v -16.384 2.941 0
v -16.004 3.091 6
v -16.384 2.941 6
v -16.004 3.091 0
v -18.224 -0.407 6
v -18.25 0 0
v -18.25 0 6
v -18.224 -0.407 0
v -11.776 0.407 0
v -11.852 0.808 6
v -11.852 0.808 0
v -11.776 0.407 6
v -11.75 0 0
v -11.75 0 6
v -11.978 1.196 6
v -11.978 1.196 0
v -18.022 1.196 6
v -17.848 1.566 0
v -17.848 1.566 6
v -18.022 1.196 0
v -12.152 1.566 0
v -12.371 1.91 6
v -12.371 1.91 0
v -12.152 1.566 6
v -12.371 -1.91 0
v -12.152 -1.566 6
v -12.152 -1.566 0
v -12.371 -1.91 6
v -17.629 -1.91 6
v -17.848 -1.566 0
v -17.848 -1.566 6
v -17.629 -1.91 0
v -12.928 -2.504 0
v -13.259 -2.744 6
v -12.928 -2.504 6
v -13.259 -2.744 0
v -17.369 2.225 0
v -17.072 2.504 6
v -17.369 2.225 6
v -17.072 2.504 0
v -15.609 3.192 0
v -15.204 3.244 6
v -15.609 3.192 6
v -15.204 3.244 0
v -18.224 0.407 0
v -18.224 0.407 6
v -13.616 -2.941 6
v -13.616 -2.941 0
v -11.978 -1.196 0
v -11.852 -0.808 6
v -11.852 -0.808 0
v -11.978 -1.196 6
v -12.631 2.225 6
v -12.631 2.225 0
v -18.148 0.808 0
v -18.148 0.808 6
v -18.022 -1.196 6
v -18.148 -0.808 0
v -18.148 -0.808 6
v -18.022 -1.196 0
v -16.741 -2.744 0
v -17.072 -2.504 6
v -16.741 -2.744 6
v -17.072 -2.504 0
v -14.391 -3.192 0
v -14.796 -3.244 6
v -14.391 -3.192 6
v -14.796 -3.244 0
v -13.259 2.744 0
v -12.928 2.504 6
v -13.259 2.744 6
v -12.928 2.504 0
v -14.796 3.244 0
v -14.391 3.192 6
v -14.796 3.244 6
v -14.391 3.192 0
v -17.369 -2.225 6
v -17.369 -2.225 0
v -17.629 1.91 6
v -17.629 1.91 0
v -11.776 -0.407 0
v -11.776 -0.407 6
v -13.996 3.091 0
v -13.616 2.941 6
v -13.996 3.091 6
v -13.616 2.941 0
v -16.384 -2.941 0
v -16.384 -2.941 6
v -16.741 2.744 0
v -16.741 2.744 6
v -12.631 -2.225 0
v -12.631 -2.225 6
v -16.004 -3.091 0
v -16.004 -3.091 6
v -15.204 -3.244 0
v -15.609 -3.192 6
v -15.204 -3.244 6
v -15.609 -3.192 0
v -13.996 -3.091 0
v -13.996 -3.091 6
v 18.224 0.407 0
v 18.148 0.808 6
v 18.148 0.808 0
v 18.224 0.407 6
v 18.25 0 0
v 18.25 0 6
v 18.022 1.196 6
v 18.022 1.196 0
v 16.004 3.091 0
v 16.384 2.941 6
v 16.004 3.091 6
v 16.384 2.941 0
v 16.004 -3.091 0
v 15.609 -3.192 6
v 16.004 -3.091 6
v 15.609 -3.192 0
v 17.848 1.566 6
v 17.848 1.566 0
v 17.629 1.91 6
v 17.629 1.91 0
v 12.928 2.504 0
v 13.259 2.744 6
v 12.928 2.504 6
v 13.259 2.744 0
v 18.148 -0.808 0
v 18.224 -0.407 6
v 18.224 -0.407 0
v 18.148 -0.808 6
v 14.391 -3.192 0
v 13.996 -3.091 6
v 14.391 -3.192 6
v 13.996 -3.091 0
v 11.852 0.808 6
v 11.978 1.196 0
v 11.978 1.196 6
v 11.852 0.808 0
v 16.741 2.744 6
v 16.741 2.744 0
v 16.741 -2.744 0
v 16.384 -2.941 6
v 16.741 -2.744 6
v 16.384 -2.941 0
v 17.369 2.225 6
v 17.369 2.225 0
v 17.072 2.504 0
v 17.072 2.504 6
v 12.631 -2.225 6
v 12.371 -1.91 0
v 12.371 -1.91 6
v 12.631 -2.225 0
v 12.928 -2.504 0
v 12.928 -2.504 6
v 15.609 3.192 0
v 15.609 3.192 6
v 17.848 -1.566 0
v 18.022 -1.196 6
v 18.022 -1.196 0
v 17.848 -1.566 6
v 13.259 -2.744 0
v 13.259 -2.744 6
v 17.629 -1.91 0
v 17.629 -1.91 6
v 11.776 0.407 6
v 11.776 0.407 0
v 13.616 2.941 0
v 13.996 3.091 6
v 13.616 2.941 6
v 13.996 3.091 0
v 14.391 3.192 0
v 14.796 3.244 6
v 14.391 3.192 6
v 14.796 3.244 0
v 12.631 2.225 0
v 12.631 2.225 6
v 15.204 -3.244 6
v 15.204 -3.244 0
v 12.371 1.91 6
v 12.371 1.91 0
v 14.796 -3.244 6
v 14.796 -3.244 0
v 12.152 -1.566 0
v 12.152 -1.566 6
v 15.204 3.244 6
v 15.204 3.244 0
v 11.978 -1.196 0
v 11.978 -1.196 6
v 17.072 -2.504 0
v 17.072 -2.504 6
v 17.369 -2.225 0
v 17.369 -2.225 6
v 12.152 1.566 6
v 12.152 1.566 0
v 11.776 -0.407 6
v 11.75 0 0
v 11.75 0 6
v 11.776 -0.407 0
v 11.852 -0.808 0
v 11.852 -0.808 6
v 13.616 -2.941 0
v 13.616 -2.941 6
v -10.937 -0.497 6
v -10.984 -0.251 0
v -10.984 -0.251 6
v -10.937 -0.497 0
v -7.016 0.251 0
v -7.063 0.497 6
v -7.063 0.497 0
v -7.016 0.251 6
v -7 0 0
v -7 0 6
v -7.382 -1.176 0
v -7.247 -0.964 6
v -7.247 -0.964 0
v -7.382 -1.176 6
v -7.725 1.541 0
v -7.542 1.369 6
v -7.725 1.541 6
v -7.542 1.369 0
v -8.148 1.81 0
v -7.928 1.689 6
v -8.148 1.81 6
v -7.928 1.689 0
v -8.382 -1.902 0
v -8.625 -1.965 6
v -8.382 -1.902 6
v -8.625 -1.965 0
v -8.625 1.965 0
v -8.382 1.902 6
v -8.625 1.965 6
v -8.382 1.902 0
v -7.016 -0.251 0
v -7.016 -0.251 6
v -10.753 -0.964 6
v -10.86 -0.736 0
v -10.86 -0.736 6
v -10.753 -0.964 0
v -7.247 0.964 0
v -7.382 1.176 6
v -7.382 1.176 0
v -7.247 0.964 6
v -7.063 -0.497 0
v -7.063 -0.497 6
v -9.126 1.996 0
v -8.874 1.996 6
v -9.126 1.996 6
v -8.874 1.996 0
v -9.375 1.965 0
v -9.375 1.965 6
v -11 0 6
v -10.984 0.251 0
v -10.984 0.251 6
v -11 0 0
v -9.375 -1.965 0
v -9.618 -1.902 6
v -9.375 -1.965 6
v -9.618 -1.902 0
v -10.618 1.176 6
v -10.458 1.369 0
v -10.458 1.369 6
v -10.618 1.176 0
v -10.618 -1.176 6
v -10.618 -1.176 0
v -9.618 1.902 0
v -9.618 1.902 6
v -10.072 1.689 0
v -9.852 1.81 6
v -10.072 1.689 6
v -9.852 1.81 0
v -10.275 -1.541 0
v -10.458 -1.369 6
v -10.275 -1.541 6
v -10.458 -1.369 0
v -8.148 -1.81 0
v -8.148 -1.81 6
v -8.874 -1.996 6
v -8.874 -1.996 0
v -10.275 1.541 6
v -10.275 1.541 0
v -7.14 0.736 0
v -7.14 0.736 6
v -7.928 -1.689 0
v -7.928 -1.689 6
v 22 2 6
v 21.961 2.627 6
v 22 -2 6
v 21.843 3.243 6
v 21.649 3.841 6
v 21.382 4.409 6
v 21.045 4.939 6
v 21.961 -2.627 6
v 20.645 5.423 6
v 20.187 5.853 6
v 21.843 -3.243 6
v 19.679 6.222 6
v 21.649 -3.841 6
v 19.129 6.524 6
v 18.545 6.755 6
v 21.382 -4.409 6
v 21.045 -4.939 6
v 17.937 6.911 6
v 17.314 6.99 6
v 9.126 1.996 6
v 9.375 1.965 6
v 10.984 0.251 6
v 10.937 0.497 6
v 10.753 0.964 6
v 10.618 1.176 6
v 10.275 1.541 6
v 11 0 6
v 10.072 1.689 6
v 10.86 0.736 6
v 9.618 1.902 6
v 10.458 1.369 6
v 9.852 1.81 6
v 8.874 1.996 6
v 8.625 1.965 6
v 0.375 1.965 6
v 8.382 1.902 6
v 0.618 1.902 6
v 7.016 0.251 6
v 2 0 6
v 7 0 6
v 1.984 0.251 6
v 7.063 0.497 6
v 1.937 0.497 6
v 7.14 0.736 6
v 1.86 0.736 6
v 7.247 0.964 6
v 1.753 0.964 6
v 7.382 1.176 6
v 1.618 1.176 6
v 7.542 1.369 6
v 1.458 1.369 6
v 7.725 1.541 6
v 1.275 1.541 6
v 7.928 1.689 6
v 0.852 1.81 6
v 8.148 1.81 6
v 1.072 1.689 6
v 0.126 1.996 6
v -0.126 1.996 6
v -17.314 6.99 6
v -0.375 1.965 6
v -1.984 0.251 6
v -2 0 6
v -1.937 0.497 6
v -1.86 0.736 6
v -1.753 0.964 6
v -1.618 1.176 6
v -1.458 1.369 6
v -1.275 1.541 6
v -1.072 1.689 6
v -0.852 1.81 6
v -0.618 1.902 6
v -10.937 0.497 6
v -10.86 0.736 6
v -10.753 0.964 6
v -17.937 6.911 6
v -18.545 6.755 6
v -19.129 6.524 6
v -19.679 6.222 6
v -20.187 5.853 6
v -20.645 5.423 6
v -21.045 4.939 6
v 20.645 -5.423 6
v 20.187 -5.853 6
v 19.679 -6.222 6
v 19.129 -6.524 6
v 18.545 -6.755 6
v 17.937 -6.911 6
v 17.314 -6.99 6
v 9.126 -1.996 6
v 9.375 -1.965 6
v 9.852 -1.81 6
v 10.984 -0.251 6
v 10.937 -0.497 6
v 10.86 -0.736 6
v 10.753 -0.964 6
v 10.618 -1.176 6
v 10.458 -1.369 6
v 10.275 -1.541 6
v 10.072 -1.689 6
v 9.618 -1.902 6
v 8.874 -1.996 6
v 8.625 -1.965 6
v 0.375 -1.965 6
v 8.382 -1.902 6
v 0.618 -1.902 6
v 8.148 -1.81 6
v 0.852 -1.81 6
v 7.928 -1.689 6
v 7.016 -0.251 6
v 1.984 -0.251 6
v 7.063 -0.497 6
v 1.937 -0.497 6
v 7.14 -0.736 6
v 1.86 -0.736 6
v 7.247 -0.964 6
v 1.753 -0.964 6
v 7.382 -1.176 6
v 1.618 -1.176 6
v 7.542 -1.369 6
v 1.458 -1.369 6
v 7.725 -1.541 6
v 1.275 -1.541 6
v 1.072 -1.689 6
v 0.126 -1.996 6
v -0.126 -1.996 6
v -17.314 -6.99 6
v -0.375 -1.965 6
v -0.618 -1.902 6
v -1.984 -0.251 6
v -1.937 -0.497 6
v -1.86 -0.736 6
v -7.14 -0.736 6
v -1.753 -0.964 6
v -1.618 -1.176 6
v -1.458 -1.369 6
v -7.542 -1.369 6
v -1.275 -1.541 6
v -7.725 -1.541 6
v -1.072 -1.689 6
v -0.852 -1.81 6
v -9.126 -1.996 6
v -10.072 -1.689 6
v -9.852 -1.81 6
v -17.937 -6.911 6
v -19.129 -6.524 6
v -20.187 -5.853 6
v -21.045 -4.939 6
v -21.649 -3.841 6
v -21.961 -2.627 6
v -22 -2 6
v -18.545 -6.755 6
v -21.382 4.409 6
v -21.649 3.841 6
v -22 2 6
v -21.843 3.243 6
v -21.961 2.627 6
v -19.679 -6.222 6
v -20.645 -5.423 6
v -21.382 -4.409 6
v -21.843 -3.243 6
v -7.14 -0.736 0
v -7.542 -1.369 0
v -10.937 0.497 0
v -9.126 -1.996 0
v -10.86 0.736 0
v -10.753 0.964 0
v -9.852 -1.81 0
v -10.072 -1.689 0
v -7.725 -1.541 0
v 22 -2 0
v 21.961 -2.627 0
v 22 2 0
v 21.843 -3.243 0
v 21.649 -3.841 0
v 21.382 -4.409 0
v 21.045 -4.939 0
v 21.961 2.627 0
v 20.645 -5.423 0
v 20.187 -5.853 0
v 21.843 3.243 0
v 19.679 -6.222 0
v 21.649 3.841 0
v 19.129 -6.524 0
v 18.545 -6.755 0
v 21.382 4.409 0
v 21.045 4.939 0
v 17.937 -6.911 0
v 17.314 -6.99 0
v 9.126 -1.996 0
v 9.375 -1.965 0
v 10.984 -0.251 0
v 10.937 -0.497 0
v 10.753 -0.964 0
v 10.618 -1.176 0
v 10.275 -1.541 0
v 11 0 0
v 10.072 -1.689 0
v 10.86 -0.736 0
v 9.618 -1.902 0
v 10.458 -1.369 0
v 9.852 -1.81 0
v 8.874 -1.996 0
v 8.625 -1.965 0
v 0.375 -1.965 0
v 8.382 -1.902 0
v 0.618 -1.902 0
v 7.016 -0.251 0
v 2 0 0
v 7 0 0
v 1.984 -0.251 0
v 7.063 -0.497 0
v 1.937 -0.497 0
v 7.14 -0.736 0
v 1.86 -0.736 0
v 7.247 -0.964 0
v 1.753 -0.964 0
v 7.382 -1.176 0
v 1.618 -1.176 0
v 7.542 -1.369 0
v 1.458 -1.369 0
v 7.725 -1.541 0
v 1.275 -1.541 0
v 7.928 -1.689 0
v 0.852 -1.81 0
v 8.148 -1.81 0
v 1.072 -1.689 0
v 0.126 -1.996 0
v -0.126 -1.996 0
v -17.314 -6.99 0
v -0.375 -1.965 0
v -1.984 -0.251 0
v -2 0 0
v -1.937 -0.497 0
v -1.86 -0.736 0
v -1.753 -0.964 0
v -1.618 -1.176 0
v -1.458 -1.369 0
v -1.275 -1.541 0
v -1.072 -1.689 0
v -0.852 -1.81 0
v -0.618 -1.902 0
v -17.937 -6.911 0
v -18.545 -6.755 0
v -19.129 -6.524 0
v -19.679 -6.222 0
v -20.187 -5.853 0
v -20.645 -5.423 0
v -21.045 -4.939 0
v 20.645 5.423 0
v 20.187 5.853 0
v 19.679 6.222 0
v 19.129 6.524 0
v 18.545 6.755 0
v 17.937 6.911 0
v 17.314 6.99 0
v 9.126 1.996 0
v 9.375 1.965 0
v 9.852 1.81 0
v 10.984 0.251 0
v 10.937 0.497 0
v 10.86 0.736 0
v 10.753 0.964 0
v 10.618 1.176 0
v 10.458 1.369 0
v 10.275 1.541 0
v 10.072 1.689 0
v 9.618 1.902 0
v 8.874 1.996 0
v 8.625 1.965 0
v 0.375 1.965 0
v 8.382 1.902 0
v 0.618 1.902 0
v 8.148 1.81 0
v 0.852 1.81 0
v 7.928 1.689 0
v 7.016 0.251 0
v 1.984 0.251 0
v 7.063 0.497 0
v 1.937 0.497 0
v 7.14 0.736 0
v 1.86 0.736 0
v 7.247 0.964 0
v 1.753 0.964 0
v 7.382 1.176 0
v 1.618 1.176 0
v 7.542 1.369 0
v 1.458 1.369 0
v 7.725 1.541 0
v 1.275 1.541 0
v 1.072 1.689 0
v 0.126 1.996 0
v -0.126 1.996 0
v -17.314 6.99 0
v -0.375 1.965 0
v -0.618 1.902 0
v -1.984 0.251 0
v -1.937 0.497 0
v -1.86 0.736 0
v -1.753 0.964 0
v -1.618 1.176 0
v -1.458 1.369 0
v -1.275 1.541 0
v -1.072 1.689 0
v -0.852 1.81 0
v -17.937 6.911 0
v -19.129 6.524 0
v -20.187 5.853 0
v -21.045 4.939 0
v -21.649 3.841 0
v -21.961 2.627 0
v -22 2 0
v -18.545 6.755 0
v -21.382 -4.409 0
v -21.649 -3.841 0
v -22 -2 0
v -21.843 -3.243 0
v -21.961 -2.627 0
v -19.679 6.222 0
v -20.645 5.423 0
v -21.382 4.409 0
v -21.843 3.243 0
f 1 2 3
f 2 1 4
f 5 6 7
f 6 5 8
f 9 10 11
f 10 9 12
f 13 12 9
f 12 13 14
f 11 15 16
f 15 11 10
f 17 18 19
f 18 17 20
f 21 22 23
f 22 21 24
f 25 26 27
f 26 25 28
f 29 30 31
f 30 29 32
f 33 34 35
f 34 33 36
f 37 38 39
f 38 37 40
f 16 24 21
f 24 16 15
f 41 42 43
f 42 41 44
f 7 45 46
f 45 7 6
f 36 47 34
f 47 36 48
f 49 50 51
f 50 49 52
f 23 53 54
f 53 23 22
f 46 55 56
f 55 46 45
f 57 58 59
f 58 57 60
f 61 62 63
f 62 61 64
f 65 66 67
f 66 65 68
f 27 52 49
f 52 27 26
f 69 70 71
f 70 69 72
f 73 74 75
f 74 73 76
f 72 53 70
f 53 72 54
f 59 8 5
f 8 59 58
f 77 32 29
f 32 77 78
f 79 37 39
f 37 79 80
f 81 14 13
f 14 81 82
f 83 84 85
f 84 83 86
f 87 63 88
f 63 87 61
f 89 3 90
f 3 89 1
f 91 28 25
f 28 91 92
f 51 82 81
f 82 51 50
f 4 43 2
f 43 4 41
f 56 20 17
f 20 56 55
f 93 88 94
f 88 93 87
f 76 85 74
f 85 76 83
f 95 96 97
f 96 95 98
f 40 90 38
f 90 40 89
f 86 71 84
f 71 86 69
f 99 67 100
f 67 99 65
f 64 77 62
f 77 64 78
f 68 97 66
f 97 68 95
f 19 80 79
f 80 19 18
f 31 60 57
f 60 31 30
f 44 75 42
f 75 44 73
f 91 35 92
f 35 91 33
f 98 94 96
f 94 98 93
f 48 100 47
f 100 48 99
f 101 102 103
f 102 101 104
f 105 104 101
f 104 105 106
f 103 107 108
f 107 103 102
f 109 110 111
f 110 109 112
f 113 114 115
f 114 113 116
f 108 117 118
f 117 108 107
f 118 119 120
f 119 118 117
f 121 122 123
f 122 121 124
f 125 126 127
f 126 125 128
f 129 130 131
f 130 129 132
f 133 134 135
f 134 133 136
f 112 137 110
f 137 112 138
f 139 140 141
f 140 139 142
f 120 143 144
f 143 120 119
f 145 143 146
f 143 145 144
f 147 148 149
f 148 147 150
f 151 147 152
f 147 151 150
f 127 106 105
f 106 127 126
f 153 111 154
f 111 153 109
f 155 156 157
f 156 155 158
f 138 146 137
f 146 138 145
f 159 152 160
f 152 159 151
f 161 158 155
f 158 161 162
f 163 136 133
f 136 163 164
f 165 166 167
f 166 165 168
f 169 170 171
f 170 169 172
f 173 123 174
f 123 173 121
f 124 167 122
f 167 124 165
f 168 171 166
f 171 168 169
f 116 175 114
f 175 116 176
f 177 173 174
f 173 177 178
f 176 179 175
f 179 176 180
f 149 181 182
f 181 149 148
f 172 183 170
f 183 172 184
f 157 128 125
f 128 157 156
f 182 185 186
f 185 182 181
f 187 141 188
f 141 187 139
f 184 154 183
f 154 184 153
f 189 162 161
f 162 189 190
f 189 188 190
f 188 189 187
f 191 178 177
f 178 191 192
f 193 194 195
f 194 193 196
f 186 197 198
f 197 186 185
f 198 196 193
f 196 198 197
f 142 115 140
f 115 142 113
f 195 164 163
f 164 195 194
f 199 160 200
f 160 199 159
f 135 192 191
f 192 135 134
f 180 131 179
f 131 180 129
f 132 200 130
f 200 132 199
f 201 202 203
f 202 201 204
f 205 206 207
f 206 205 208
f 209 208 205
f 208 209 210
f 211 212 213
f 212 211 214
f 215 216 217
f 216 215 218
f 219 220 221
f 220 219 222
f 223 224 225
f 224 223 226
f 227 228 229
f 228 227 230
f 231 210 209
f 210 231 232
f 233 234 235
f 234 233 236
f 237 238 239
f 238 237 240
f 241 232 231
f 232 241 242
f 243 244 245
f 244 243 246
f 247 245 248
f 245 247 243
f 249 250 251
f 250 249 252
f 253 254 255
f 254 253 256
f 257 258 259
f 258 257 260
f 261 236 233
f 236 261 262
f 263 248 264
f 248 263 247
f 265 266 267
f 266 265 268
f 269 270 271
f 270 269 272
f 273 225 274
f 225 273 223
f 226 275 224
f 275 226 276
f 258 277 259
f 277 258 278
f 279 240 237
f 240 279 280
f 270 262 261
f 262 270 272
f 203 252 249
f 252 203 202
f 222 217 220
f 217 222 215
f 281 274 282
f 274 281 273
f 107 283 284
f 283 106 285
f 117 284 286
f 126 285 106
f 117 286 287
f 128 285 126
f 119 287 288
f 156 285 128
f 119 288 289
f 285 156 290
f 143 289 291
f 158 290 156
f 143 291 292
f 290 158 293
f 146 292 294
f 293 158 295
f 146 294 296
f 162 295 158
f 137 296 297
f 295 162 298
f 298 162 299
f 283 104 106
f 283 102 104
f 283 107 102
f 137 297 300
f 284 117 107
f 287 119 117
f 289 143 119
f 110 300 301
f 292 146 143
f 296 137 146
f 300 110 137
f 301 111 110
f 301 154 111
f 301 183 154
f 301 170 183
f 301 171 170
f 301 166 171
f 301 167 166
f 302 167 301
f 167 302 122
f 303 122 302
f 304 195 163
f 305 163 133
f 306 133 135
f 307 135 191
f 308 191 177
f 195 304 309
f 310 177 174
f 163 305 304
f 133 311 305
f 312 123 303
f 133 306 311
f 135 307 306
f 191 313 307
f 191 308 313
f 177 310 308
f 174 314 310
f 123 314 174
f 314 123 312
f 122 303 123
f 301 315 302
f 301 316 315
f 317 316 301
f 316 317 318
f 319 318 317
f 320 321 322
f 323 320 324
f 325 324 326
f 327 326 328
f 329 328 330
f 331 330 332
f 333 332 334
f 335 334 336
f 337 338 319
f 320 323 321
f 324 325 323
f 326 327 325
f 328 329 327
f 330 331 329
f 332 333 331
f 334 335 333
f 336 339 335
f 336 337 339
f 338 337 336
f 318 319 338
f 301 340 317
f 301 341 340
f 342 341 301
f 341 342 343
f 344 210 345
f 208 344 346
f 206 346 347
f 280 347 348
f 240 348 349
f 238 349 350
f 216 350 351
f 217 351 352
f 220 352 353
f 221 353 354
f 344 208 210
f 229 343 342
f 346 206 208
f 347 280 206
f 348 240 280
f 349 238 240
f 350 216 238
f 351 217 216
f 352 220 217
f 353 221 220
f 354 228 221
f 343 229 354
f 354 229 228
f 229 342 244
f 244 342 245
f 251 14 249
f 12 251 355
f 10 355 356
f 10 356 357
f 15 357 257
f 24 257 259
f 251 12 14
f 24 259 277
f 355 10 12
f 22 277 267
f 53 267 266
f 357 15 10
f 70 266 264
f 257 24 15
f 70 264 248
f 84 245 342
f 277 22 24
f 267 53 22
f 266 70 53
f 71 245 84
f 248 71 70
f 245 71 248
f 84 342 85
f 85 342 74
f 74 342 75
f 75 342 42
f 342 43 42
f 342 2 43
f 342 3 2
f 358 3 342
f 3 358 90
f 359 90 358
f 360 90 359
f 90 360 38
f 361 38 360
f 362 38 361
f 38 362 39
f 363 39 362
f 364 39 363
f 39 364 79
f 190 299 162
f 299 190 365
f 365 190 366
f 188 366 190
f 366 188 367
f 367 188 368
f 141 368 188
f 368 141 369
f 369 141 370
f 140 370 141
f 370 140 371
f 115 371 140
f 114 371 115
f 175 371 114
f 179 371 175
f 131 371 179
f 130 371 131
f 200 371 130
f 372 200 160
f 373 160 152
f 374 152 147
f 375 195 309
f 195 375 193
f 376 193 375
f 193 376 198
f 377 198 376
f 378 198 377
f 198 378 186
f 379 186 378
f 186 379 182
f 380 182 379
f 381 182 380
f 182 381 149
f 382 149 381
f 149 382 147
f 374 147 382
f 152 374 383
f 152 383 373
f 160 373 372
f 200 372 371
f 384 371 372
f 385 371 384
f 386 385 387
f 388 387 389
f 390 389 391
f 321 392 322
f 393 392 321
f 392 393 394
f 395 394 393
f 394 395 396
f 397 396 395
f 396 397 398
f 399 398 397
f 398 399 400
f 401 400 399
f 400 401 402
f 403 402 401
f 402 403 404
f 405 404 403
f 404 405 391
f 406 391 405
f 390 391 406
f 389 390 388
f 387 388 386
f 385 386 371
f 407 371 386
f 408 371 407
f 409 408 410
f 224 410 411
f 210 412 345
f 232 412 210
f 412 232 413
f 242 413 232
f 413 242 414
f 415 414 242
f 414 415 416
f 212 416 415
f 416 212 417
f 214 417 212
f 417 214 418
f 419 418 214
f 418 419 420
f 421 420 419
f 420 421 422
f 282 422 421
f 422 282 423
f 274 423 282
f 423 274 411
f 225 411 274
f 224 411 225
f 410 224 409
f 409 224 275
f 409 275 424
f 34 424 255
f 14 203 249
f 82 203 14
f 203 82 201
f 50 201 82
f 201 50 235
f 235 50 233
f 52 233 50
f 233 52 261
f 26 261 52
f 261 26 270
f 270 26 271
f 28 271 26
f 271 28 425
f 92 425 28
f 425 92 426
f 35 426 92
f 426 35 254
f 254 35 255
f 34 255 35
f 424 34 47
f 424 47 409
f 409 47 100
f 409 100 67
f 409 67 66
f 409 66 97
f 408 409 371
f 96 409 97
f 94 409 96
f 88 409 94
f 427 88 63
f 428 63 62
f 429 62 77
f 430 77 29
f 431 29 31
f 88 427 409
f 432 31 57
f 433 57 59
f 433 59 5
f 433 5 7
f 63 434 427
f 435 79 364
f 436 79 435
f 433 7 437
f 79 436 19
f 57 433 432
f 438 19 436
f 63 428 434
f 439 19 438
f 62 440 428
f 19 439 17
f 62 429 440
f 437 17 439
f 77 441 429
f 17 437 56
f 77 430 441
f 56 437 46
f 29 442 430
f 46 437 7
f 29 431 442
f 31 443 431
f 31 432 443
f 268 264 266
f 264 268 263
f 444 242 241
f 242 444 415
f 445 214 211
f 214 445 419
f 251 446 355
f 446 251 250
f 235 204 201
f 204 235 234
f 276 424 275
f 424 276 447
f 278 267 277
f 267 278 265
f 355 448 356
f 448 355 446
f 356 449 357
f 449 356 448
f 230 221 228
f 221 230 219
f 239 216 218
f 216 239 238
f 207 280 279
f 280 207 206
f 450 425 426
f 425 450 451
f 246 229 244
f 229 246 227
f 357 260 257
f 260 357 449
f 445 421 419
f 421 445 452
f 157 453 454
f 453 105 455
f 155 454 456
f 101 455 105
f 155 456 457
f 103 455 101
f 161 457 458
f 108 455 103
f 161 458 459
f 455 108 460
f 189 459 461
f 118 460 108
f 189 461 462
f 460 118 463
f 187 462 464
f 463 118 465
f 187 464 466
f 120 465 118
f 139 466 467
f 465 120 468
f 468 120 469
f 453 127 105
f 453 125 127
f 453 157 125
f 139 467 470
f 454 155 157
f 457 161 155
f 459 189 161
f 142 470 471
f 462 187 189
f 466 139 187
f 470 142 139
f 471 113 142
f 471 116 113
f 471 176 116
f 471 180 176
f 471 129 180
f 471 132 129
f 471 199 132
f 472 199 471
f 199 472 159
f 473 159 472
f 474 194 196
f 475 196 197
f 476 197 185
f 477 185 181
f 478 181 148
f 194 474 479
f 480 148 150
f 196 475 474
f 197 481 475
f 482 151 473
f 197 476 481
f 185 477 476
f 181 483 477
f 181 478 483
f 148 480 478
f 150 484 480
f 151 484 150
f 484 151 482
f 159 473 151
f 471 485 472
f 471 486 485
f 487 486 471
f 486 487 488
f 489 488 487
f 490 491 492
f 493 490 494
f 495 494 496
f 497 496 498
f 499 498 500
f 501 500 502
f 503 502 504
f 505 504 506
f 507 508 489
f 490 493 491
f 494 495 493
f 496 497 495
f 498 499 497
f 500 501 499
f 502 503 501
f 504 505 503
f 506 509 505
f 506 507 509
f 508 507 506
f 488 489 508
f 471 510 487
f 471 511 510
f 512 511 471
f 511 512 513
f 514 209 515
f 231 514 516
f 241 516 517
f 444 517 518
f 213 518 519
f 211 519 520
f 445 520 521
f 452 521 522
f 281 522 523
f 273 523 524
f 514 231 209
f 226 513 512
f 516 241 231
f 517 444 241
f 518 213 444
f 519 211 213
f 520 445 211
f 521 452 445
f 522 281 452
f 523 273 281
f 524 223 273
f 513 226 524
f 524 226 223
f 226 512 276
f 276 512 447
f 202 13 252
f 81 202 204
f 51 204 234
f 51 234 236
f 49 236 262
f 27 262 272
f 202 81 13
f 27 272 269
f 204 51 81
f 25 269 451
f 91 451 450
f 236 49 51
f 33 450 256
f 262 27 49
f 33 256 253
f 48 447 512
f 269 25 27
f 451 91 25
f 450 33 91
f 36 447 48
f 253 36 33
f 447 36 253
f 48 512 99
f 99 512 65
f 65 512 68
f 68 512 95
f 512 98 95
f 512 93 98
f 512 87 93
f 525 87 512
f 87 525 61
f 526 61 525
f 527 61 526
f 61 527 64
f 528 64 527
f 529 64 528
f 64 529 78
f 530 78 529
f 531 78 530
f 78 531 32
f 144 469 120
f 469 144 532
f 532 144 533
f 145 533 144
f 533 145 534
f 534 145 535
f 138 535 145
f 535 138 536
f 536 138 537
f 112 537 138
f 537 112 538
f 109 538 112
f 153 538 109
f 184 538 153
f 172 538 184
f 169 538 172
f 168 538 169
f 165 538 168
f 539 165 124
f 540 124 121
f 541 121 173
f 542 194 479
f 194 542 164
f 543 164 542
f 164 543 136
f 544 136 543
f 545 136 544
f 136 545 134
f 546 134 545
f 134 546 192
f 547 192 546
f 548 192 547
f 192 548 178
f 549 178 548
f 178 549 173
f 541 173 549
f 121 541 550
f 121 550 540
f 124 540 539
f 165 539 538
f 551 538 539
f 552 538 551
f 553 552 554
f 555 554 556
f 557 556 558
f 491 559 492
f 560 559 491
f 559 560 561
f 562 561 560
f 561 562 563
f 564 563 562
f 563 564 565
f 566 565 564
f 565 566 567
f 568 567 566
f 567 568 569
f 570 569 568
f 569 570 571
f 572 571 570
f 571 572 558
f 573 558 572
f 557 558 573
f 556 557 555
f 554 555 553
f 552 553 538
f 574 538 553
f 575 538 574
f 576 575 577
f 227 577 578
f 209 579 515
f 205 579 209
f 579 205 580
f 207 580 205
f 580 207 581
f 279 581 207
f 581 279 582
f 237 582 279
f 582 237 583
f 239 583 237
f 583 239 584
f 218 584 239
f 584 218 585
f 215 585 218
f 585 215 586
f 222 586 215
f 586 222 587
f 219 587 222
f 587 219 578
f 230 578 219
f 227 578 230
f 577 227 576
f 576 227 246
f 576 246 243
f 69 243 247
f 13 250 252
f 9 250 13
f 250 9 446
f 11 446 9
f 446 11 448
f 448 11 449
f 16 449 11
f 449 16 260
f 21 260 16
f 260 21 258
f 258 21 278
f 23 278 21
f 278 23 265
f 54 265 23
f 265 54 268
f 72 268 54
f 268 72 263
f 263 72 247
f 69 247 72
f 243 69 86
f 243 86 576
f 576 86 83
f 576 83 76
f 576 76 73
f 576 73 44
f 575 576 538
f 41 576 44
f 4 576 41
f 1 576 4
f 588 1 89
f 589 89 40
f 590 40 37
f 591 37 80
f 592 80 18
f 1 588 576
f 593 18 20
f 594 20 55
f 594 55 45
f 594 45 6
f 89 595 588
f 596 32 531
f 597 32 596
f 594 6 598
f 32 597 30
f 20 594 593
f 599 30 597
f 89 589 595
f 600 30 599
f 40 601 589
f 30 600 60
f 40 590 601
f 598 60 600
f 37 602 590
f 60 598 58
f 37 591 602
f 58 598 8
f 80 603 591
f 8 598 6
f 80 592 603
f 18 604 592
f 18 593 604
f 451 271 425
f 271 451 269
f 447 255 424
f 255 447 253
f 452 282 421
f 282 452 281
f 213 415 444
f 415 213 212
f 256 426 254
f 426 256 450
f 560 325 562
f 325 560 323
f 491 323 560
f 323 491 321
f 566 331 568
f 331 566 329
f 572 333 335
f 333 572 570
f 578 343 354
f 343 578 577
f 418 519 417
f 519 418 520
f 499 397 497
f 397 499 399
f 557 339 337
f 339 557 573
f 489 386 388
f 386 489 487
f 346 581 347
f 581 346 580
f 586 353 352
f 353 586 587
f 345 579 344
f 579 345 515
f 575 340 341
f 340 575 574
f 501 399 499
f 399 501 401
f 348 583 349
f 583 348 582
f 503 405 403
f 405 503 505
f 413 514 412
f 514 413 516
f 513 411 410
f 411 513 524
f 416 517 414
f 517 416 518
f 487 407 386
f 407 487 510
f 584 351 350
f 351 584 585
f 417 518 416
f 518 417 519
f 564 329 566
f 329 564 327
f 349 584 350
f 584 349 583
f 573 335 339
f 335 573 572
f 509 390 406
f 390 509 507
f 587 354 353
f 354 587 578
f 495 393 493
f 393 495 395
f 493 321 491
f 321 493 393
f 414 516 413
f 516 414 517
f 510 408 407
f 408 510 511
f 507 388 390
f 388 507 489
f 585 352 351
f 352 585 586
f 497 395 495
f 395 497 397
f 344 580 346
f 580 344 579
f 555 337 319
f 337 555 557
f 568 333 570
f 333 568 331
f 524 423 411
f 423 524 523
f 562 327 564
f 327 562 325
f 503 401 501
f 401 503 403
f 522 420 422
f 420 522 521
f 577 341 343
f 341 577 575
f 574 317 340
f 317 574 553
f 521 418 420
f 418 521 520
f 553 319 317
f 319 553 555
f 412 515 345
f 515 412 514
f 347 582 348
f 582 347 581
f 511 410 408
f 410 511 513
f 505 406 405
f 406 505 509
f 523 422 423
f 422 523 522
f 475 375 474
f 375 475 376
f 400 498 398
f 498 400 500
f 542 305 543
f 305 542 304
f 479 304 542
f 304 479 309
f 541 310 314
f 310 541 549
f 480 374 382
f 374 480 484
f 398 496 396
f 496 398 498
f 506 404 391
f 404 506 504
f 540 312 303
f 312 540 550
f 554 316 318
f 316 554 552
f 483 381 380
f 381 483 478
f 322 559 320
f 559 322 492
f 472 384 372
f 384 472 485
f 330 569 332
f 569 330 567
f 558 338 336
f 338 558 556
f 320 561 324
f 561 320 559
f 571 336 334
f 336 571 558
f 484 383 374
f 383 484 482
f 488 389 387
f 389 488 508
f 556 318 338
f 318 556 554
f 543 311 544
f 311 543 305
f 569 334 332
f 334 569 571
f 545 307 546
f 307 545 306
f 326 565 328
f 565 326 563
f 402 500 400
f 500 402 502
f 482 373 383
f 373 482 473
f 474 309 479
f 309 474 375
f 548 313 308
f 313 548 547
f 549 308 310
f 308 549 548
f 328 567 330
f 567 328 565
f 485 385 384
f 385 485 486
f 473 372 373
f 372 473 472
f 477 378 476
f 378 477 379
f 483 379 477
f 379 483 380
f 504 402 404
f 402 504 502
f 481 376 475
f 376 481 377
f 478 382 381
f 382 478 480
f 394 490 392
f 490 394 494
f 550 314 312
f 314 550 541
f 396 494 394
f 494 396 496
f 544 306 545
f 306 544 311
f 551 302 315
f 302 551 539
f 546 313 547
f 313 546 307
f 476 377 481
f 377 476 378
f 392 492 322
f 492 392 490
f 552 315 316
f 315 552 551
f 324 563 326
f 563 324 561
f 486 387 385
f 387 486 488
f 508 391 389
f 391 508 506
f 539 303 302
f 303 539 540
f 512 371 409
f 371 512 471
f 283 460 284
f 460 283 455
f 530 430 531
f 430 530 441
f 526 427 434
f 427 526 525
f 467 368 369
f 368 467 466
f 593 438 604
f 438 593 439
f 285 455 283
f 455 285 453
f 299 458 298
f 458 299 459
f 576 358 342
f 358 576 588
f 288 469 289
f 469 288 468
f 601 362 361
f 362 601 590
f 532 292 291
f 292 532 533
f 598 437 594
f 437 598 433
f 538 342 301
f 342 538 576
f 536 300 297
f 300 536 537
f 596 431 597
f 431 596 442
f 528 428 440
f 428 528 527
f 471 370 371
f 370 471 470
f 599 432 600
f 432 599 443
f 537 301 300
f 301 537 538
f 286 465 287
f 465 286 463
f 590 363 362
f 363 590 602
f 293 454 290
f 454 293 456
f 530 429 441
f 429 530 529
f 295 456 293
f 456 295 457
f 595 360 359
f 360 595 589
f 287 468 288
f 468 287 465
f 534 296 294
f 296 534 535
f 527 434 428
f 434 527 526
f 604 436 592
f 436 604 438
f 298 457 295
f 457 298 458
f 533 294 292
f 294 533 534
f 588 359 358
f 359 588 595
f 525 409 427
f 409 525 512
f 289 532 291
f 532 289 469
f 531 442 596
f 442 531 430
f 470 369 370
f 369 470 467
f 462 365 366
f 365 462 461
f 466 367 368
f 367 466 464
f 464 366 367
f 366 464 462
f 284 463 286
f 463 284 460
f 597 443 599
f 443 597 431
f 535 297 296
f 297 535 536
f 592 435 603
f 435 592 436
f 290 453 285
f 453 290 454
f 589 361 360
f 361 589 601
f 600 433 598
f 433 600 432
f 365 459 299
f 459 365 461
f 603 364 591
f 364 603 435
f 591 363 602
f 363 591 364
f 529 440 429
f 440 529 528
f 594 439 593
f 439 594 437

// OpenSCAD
$fn = 50;


difference() {
	union() {
		hull() {
			translate(v = [-17.0000000000, 2.0000000000, 0]) {
				cylinder(h = 6, r = 5);
			}
			translate(v = [17.0000000000, 2.0000000000, 0]) {
				cylinder(h = 6, r = 5);
			}
			translate(v = [-17.0000000000, -2.0000000000, 0]) {
				cylinder(h = 6, r = 5);
			}
			translate(v = [17.0000000000, -2.0000000000, 0]) {
				cylinder(h = 6, r = 5);
			}
		}
	}
	union() {
		#translate(v = [-15.0000000000, 0.0000000000, 0]) {
			cylinder(h = 6, r = 3.2500000000);
		}
		#translate(v = [15.0000000000, 0.0000000000, 0]) {
			cylinder(h = 6, r = 3.2500000000);
		}
		#translate(v = [-15.0000000000, 0.0000000000, -100.0000000000]) {
			cylinder(h = 200, r = 3.2500000000);
		}
		#translate(v = [-15.0000000000, 0.0000000000, -100.0000000000]) {
			cylinder(h = 200, r = 3.2500000000);
		}
		#translate(v = [15.0000000000, 0.0000000000, -100.0000000000]) {
			cylinder(h = 200, r = 3.2500000000);
		}
		#translate(v = [15.0000000000, 0.0000000000, -100.0000000000]) {
			cylinder(h = 200, r = 3.2500000000);
		}
		#translate(v = [-15.0000000000, 0.0000000000, 0]) {
			cylinder(h = 6, r = 1.8000000000);
		}
		#translate(v = [15.0000000000, 0.0000000000, 0]) {
			cylinder(h = 6, r = 1.8000000000);
		}
		#translate(v = [-15.0000000000, 0.0000000000, 0]) {
			cylinder(h = 6, r = 1.8000000000);
		}
		#translate(v = [15.0000000000, 0.0000000000, 0]) {
			cylinder(h = 6, r = 1.8000000000);
		}
		#translate(v = [-15.0000000000, 0.0000000000, 0]) {
			cylinder(h = 6, r = 1.8000000000);
		}
		#translate(v = [15.0000000000, 0.0000000000, 0]) {
			cylinder(h = 6, r = 1.8000000000);
		}
		#translate(v = [-9.0000000000, 0, 0]) {
			cylinder(h = 6, r = 2.0000000000);
		}
		#cylinder(h = 6, r = 2.0000000000);
		#translate(v = [9.0000000000, 0, 0]) {
			cylinder(h = 6, r = 2.0000000000);
		}
	}
}
